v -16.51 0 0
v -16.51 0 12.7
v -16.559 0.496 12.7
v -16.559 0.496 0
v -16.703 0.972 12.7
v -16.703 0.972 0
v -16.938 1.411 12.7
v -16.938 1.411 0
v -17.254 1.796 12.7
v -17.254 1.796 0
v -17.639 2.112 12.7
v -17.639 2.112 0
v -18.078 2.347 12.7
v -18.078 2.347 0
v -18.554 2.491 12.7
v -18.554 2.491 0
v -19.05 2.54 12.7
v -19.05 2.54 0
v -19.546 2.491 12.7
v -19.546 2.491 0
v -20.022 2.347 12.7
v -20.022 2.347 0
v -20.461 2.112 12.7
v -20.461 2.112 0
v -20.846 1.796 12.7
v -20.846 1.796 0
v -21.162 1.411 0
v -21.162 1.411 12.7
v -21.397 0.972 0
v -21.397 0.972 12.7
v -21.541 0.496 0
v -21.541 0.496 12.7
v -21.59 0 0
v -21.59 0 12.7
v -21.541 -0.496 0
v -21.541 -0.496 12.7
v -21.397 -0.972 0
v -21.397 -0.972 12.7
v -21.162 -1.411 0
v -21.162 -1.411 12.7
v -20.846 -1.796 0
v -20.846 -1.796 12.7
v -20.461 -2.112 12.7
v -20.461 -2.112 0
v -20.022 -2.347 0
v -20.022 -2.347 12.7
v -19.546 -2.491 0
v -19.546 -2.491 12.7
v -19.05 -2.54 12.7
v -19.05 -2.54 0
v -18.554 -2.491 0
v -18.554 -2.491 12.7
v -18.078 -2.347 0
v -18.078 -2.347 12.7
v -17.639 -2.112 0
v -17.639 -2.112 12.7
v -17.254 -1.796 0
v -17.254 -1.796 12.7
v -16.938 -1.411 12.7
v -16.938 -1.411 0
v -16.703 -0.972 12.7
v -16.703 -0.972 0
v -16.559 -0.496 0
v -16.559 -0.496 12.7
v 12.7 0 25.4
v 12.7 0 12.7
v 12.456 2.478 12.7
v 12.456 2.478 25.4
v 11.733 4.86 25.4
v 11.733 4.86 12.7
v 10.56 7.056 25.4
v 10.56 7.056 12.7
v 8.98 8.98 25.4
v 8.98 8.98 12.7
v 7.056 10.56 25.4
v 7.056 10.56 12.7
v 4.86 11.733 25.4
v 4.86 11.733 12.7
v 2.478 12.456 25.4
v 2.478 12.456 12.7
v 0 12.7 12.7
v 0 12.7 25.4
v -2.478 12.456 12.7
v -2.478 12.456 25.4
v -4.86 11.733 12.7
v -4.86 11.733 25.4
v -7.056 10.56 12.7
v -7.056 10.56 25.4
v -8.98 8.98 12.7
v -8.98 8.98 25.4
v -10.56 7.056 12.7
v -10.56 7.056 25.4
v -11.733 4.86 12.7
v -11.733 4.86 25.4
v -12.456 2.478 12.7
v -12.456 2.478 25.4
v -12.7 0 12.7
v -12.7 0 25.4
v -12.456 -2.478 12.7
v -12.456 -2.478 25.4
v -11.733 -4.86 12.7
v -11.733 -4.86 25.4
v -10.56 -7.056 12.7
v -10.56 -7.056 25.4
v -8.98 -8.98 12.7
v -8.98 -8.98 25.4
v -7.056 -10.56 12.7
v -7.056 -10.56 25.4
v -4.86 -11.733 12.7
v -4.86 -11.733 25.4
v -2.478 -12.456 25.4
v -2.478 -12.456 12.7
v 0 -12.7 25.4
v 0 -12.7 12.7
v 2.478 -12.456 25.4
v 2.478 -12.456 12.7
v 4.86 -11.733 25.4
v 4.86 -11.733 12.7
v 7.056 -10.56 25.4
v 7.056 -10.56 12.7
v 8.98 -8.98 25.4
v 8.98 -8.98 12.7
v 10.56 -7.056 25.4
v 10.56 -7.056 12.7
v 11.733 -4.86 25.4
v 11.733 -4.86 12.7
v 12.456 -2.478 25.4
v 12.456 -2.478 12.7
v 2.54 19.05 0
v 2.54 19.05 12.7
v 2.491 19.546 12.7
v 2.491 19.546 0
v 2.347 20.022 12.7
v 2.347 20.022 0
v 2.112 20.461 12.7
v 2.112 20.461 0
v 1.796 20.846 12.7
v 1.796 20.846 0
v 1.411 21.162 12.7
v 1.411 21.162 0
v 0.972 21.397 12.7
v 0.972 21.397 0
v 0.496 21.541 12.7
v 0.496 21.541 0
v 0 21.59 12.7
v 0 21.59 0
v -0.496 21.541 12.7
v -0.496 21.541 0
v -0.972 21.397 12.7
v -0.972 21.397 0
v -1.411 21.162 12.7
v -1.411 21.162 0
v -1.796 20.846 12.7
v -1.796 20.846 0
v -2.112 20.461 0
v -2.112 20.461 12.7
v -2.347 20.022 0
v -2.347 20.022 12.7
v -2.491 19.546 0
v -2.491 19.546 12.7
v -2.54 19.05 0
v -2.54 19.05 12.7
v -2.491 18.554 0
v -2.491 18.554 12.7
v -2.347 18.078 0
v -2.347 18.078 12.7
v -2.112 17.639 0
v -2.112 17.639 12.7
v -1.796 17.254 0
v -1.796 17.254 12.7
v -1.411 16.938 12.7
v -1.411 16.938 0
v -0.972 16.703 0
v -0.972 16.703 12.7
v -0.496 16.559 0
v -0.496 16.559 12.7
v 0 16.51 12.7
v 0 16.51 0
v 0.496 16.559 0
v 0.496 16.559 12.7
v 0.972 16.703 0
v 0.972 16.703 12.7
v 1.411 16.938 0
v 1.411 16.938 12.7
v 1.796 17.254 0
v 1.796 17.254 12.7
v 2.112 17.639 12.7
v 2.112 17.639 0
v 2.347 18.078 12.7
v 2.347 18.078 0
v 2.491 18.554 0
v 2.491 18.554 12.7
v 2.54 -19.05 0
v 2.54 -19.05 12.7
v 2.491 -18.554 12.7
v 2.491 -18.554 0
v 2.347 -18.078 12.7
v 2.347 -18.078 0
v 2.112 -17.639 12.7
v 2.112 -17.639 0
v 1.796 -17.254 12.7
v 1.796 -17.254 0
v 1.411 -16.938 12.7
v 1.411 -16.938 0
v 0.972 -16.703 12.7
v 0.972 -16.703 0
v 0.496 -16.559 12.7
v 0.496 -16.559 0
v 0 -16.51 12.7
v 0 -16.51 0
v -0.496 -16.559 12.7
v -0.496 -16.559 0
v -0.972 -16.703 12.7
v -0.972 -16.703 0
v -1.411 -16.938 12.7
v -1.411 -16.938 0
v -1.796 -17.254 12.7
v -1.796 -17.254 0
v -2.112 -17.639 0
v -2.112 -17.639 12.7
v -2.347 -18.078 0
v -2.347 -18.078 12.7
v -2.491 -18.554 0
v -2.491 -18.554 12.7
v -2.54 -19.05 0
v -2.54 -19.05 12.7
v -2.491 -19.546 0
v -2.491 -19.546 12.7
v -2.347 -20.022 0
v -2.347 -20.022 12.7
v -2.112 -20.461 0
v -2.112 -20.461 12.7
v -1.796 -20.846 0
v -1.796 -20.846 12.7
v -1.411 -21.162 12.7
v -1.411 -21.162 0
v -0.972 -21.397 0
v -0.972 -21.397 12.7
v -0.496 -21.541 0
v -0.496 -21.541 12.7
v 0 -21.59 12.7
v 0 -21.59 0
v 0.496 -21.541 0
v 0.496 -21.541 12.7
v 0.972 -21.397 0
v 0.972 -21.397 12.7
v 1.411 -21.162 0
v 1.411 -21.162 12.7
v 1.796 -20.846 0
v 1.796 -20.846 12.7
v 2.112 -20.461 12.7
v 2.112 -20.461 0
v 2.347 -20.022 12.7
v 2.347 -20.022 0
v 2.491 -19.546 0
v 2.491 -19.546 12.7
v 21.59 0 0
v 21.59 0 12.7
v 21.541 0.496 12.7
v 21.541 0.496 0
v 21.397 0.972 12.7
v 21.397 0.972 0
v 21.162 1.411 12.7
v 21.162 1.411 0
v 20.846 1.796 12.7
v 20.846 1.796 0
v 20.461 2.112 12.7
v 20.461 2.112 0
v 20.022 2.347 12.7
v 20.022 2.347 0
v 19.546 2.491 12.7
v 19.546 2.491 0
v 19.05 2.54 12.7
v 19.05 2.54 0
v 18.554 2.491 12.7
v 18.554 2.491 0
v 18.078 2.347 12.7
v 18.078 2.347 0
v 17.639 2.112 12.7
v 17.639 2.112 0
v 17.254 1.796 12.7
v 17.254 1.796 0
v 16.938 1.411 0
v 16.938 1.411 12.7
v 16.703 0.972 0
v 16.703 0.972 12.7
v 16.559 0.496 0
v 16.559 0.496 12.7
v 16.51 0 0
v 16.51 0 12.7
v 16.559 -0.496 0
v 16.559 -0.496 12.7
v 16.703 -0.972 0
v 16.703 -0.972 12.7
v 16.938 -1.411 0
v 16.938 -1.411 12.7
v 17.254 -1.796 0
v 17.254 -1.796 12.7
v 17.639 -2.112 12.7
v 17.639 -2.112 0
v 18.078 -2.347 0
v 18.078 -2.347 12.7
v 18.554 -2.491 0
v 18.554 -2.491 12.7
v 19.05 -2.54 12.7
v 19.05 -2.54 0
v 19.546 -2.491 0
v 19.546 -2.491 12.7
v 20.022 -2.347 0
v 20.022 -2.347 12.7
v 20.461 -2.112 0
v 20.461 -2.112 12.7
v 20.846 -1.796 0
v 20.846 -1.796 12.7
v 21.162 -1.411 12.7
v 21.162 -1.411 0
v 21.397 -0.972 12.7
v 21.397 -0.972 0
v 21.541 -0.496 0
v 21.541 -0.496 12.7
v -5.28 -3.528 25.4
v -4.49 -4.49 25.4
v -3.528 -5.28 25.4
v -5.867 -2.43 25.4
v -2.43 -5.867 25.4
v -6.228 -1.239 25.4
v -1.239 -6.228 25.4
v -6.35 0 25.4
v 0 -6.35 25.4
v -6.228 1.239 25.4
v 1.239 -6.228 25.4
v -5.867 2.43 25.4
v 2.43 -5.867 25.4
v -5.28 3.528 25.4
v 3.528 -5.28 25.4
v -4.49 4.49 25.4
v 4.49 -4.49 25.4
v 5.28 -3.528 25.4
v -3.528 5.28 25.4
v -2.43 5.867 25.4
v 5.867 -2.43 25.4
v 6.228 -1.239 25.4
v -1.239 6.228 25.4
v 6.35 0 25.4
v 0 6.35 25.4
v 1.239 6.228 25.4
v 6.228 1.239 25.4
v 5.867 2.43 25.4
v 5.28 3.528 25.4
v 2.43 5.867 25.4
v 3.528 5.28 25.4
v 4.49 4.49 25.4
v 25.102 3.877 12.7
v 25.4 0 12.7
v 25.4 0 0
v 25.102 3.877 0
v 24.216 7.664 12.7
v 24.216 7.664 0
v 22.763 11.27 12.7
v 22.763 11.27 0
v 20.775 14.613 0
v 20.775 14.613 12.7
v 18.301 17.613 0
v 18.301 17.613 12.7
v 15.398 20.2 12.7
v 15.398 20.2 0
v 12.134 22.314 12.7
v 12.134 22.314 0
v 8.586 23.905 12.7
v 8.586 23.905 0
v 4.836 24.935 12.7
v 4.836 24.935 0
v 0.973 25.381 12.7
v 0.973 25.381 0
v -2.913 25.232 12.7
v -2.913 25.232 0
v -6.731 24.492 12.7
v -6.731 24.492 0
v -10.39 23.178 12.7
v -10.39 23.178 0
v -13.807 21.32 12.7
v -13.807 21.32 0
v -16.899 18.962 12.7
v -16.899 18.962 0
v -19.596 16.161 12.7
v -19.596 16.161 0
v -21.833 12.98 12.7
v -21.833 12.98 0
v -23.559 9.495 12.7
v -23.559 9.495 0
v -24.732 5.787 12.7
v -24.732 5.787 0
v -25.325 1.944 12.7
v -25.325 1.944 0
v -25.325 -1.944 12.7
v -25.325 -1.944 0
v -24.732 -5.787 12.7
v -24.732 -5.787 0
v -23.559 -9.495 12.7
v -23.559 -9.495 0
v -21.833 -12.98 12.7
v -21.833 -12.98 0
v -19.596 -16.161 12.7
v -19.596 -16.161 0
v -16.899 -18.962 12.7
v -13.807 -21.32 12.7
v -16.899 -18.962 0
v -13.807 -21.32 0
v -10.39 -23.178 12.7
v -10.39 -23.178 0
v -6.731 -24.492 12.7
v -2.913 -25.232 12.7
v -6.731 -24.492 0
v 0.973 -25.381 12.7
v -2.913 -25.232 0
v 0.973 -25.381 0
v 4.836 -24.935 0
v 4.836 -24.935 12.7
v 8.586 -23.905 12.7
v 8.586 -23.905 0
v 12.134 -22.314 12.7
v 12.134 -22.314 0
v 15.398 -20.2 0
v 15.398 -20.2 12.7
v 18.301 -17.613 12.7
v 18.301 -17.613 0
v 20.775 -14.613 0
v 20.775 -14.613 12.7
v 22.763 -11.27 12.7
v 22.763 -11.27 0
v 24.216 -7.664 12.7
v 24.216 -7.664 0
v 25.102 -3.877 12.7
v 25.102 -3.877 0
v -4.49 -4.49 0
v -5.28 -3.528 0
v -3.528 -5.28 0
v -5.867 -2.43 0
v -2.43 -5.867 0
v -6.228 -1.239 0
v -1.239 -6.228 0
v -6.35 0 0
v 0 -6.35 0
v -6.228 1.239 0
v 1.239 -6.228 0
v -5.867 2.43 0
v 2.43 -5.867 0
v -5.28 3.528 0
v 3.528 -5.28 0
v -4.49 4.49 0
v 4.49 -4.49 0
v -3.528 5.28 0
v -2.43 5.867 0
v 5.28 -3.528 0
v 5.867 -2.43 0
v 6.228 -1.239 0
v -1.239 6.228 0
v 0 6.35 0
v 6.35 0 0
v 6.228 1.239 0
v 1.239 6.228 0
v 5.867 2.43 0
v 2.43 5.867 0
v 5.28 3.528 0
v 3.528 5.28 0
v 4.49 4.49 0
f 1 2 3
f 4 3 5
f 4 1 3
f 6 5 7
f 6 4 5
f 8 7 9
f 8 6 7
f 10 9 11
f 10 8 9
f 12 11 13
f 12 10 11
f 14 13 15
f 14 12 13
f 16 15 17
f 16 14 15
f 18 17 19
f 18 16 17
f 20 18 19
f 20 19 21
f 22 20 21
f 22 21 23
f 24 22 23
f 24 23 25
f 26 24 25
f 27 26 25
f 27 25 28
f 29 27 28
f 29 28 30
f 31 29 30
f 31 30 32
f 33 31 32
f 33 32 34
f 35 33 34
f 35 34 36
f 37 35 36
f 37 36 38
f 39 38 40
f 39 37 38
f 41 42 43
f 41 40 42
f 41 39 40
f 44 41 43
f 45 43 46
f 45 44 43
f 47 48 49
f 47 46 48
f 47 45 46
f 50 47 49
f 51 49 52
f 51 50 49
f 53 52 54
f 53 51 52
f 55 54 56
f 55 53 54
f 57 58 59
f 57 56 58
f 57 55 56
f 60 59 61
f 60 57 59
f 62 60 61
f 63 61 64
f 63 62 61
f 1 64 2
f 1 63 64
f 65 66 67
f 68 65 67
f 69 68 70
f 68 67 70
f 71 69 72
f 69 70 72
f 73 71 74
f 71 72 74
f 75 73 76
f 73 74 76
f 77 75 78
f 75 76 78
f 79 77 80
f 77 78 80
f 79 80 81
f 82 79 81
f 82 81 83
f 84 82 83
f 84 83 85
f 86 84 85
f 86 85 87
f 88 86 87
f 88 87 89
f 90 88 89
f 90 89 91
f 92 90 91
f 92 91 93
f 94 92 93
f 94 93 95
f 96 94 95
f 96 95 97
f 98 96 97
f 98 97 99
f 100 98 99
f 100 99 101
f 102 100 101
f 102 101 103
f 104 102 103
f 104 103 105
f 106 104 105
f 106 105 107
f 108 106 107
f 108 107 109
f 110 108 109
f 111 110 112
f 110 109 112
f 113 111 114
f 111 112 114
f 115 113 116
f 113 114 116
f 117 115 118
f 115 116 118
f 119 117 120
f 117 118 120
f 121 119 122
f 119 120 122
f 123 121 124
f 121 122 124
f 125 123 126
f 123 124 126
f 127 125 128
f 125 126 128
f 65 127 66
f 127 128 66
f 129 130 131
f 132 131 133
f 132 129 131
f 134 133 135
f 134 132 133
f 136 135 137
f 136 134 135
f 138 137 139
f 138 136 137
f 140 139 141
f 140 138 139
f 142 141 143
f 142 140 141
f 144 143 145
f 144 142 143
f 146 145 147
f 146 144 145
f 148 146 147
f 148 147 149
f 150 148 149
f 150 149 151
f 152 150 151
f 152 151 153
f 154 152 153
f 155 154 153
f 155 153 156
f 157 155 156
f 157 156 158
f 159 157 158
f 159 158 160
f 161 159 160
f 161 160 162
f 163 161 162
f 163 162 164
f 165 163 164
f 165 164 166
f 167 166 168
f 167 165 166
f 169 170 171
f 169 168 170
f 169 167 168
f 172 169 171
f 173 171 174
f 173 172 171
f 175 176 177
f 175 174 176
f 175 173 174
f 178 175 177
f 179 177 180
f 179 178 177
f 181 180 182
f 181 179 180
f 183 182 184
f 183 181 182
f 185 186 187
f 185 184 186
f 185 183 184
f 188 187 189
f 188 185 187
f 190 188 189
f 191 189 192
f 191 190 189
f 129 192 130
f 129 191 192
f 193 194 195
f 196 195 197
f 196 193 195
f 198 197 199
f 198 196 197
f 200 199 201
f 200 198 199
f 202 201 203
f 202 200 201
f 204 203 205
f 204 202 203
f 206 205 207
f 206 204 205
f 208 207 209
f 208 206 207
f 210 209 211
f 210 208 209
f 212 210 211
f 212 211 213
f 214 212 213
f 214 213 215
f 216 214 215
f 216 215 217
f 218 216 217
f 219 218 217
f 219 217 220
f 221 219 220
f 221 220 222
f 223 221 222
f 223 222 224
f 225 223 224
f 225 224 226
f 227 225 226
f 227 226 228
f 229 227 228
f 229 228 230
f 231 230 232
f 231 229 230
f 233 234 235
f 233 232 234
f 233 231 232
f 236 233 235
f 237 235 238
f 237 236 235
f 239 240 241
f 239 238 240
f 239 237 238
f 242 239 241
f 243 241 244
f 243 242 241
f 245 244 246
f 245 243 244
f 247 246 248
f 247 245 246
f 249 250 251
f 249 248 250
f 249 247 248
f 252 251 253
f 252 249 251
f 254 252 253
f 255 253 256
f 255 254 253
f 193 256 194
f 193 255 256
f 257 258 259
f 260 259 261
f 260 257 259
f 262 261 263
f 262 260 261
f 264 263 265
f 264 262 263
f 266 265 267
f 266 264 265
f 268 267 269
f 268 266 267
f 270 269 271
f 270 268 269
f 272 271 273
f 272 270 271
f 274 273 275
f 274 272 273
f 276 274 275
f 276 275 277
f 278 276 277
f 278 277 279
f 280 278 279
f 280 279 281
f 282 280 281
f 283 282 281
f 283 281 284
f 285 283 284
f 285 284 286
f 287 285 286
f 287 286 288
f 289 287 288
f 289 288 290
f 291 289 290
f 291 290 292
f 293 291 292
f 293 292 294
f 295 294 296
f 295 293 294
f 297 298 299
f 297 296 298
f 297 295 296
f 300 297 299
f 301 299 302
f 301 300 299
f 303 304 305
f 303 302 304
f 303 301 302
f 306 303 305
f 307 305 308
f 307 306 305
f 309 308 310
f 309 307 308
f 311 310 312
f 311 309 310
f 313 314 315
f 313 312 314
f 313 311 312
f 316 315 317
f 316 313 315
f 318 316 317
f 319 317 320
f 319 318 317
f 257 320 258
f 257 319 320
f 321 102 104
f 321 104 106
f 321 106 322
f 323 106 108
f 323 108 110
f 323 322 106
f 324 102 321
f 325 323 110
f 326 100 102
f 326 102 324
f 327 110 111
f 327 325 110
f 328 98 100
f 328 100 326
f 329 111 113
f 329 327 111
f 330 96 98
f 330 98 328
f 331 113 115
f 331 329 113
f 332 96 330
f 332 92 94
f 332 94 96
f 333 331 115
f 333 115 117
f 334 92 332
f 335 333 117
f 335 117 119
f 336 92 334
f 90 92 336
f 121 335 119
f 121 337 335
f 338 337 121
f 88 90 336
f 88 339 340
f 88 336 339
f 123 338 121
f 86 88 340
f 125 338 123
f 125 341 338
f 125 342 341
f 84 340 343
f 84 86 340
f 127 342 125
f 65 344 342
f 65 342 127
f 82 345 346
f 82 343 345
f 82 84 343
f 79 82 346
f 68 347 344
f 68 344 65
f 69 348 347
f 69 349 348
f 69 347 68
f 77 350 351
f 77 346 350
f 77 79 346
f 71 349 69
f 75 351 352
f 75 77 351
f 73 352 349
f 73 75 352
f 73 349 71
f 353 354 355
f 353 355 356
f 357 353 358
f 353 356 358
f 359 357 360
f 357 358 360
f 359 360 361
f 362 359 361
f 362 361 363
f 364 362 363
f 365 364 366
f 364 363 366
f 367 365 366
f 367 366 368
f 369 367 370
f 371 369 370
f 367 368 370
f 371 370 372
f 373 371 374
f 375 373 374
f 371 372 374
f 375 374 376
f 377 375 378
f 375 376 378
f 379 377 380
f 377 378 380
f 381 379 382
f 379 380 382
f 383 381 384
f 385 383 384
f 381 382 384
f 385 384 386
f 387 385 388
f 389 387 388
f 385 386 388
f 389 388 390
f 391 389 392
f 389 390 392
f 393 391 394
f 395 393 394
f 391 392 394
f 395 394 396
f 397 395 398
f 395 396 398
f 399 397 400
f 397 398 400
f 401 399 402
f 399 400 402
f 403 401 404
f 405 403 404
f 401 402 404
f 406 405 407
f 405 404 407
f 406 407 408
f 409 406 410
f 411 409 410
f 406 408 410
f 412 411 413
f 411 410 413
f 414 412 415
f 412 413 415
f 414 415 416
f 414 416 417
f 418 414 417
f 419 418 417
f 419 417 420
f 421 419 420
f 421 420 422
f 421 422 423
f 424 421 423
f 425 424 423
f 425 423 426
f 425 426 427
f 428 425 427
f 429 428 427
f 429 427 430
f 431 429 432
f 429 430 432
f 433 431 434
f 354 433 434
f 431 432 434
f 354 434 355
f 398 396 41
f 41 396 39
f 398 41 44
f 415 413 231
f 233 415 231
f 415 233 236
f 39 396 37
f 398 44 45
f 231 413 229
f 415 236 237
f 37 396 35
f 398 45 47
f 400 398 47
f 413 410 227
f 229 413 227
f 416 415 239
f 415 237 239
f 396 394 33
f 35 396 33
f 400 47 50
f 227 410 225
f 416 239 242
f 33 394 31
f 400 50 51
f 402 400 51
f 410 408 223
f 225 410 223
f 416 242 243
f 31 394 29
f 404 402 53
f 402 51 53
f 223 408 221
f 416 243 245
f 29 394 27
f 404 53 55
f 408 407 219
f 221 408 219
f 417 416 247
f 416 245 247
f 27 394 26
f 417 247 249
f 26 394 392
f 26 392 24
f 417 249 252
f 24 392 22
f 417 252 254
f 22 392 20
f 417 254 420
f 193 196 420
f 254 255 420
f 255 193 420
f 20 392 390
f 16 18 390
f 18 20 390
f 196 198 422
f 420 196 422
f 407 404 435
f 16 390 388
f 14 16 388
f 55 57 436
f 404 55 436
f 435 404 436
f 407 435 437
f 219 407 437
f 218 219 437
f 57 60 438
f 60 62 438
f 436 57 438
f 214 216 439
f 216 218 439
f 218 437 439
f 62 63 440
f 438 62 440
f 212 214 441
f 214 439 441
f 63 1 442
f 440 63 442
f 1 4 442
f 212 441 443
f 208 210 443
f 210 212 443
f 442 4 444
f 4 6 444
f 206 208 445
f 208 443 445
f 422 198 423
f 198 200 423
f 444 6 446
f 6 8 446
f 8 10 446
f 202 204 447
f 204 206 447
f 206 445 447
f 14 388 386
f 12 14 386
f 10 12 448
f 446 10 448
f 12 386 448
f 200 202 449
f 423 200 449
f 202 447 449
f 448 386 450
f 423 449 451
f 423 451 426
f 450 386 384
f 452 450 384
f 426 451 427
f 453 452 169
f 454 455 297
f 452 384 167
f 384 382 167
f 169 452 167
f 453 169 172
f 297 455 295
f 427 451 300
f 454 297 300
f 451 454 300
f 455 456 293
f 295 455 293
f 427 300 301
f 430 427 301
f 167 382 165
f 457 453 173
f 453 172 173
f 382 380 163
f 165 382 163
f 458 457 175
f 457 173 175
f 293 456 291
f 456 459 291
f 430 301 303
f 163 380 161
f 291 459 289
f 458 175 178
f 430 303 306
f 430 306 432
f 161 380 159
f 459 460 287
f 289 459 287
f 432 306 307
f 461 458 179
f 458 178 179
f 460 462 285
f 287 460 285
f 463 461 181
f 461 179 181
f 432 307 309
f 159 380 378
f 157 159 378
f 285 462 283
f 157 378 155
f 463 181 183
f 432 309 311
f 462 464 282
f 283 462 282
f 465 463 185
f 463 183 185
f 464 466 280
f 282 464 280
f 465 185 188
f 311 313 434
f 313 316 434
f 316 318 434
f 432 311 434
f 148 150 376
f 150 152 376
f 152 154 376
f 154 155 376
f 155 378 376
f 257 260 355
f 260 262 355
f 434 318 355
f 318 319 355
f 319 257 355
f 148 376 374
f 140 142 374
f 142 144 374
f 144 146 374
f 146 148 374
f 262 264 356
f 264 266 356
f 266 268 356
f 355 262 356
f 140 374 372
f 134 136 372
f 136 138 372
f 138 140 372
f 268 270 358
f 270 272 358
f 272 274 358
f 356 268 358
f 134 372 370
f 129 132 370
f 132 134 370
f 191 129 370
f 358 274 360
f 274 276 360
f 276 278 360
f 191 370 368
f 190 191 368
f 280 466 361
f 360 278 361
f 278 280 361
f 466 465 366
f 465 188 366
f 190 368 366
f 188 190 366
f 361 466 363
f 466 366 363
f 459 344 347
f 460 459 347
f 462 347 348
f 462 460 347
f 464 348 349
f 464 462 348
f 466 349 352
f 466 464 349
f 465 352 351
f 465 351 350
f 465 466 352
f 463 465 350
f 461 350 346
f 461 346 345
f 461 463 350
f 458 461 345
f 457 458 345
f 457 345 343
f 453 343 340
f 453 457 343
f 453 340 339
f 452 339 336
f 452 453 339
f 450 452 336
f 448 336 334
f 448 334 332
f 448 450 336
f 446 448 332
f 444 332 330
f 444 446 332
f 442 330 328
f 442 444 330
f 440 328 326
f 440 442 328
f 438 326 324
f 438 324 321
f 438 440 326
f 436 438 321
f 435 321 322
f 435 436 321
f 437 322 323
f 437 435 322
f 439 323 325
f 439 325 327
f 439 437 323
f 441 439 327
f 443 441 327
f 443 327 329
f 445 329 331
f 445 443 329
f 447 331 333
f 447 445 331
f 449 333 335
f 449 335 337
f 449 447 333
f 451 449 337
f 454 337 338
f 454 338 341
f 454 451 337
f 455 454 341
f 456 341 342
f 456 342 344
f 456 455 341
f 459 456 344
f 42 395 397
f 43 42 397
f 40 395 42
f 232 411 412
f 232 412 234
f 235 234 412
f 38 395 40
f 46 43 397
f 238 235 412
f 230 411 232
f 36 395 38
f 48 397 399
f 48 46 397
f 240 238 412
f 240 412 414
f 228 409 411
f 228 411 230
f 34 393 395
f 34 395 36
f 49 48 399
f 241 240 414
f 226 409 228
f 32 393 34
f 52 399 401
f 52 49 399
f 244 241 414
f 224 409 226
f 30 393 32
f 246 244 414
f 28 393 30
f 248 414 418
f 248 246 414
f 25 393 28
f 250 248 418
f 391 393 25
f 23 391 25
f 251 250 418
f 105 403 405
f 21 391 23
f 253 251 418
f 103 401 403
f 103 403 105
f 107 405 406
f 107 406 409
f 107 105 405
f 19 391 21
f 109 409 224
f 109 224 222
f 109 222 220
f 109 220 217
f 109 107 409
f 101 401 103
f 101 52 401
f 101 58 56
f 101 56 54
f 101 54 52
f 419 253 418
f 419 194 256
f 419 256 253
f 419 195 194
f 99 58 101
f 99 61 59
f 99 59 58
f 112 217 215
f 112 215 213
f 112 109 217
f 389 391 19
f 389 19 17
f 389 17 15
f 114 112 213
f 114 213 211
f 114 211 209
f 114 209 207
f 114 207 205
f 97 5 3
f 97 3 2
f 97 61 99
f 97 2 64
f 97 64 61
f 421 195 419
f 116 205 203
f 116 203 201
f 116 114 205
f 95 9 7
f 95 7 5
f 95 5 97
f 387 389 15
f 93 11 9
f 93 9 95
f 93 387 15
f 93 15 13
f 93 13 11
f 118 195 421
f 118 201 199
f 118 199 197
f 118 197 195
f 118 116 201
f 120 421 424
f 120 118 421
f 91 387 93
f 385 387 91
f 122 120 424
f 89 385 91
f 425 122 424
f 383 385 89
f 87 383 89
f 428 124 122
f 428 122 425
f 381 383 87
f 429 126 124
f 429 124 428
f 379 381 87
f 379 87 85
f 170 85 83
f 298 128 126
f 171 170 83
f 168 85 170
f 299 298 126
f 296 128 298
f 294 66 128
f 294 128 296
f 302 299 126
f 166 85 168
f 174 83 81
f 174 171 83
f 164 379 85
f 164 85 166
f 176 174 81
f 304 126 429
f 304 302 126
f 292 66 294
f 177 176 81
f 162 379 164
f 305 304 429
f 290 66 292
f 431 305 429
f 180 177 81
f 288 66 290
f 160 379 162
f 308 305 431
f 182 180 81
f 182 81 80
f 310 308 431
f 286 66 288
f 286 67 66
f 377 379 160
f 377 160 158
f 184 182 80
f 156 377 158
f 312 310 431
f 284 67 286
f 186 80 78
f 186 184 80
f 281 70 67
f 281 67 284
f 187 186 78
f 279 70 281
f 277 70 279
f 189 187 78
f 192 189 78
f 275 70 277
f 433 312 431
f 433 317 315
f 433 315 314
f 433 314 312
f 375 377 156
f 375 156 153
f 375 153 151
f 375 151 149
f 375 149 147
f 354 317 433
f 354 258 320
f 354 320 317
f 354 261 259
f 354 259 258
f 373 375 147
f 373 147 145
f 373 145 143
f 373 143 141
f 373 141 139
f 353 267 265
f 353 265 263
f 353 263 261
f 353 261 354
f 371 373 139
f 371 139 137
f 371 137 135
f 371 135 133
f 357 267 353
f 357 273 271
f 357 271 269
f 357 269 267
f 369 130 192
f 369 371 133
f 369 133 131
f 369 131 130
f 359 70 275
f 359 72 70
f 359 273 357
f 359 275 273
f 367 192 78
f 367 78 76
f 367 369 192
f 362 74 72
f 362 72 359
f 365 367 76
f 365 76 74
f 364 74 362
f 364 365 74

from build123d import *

# Parameters (mm, degrees)
F0_R     = 25.4
F1_DEPTH = 12.7
F2_R     = 12.7
F3_DEPTH = 25.4
F4_R     = 2.54
F4_R_2   = 6.35
F5_DEPTH = 25.4


with BuildPart() as f1:
    # F0 (on Top) → F1 (new body)
    with BuildSketch(Plane.XY):
        Circle(F0_R)
    extrude(amount=F1_DEPTH)

    # F2 (on Top) → F3 (join)
    with BuildSketch(Plane.XY):
        Circle(F2_R)
    extrude(amount=F3_DEPTH)

    # F4 (on Top) → F5 (cut)
    with BuildSketch(Plane.XY):
        with Locations((0, 19.05)):
            Circle(F4_R)
        with Locations((-19.05, 0)):
            Circle(F4_R)
        with Locations((0, -19.05)):
            Circle(F4_R)
        with Locations((19.05, 0)):
            Circle(F4_R)
        Circle(F4_R_2)
    extrude(amount=F5_DEPTH, mode=Mode.SUBTRACT)


solid = f1.part
